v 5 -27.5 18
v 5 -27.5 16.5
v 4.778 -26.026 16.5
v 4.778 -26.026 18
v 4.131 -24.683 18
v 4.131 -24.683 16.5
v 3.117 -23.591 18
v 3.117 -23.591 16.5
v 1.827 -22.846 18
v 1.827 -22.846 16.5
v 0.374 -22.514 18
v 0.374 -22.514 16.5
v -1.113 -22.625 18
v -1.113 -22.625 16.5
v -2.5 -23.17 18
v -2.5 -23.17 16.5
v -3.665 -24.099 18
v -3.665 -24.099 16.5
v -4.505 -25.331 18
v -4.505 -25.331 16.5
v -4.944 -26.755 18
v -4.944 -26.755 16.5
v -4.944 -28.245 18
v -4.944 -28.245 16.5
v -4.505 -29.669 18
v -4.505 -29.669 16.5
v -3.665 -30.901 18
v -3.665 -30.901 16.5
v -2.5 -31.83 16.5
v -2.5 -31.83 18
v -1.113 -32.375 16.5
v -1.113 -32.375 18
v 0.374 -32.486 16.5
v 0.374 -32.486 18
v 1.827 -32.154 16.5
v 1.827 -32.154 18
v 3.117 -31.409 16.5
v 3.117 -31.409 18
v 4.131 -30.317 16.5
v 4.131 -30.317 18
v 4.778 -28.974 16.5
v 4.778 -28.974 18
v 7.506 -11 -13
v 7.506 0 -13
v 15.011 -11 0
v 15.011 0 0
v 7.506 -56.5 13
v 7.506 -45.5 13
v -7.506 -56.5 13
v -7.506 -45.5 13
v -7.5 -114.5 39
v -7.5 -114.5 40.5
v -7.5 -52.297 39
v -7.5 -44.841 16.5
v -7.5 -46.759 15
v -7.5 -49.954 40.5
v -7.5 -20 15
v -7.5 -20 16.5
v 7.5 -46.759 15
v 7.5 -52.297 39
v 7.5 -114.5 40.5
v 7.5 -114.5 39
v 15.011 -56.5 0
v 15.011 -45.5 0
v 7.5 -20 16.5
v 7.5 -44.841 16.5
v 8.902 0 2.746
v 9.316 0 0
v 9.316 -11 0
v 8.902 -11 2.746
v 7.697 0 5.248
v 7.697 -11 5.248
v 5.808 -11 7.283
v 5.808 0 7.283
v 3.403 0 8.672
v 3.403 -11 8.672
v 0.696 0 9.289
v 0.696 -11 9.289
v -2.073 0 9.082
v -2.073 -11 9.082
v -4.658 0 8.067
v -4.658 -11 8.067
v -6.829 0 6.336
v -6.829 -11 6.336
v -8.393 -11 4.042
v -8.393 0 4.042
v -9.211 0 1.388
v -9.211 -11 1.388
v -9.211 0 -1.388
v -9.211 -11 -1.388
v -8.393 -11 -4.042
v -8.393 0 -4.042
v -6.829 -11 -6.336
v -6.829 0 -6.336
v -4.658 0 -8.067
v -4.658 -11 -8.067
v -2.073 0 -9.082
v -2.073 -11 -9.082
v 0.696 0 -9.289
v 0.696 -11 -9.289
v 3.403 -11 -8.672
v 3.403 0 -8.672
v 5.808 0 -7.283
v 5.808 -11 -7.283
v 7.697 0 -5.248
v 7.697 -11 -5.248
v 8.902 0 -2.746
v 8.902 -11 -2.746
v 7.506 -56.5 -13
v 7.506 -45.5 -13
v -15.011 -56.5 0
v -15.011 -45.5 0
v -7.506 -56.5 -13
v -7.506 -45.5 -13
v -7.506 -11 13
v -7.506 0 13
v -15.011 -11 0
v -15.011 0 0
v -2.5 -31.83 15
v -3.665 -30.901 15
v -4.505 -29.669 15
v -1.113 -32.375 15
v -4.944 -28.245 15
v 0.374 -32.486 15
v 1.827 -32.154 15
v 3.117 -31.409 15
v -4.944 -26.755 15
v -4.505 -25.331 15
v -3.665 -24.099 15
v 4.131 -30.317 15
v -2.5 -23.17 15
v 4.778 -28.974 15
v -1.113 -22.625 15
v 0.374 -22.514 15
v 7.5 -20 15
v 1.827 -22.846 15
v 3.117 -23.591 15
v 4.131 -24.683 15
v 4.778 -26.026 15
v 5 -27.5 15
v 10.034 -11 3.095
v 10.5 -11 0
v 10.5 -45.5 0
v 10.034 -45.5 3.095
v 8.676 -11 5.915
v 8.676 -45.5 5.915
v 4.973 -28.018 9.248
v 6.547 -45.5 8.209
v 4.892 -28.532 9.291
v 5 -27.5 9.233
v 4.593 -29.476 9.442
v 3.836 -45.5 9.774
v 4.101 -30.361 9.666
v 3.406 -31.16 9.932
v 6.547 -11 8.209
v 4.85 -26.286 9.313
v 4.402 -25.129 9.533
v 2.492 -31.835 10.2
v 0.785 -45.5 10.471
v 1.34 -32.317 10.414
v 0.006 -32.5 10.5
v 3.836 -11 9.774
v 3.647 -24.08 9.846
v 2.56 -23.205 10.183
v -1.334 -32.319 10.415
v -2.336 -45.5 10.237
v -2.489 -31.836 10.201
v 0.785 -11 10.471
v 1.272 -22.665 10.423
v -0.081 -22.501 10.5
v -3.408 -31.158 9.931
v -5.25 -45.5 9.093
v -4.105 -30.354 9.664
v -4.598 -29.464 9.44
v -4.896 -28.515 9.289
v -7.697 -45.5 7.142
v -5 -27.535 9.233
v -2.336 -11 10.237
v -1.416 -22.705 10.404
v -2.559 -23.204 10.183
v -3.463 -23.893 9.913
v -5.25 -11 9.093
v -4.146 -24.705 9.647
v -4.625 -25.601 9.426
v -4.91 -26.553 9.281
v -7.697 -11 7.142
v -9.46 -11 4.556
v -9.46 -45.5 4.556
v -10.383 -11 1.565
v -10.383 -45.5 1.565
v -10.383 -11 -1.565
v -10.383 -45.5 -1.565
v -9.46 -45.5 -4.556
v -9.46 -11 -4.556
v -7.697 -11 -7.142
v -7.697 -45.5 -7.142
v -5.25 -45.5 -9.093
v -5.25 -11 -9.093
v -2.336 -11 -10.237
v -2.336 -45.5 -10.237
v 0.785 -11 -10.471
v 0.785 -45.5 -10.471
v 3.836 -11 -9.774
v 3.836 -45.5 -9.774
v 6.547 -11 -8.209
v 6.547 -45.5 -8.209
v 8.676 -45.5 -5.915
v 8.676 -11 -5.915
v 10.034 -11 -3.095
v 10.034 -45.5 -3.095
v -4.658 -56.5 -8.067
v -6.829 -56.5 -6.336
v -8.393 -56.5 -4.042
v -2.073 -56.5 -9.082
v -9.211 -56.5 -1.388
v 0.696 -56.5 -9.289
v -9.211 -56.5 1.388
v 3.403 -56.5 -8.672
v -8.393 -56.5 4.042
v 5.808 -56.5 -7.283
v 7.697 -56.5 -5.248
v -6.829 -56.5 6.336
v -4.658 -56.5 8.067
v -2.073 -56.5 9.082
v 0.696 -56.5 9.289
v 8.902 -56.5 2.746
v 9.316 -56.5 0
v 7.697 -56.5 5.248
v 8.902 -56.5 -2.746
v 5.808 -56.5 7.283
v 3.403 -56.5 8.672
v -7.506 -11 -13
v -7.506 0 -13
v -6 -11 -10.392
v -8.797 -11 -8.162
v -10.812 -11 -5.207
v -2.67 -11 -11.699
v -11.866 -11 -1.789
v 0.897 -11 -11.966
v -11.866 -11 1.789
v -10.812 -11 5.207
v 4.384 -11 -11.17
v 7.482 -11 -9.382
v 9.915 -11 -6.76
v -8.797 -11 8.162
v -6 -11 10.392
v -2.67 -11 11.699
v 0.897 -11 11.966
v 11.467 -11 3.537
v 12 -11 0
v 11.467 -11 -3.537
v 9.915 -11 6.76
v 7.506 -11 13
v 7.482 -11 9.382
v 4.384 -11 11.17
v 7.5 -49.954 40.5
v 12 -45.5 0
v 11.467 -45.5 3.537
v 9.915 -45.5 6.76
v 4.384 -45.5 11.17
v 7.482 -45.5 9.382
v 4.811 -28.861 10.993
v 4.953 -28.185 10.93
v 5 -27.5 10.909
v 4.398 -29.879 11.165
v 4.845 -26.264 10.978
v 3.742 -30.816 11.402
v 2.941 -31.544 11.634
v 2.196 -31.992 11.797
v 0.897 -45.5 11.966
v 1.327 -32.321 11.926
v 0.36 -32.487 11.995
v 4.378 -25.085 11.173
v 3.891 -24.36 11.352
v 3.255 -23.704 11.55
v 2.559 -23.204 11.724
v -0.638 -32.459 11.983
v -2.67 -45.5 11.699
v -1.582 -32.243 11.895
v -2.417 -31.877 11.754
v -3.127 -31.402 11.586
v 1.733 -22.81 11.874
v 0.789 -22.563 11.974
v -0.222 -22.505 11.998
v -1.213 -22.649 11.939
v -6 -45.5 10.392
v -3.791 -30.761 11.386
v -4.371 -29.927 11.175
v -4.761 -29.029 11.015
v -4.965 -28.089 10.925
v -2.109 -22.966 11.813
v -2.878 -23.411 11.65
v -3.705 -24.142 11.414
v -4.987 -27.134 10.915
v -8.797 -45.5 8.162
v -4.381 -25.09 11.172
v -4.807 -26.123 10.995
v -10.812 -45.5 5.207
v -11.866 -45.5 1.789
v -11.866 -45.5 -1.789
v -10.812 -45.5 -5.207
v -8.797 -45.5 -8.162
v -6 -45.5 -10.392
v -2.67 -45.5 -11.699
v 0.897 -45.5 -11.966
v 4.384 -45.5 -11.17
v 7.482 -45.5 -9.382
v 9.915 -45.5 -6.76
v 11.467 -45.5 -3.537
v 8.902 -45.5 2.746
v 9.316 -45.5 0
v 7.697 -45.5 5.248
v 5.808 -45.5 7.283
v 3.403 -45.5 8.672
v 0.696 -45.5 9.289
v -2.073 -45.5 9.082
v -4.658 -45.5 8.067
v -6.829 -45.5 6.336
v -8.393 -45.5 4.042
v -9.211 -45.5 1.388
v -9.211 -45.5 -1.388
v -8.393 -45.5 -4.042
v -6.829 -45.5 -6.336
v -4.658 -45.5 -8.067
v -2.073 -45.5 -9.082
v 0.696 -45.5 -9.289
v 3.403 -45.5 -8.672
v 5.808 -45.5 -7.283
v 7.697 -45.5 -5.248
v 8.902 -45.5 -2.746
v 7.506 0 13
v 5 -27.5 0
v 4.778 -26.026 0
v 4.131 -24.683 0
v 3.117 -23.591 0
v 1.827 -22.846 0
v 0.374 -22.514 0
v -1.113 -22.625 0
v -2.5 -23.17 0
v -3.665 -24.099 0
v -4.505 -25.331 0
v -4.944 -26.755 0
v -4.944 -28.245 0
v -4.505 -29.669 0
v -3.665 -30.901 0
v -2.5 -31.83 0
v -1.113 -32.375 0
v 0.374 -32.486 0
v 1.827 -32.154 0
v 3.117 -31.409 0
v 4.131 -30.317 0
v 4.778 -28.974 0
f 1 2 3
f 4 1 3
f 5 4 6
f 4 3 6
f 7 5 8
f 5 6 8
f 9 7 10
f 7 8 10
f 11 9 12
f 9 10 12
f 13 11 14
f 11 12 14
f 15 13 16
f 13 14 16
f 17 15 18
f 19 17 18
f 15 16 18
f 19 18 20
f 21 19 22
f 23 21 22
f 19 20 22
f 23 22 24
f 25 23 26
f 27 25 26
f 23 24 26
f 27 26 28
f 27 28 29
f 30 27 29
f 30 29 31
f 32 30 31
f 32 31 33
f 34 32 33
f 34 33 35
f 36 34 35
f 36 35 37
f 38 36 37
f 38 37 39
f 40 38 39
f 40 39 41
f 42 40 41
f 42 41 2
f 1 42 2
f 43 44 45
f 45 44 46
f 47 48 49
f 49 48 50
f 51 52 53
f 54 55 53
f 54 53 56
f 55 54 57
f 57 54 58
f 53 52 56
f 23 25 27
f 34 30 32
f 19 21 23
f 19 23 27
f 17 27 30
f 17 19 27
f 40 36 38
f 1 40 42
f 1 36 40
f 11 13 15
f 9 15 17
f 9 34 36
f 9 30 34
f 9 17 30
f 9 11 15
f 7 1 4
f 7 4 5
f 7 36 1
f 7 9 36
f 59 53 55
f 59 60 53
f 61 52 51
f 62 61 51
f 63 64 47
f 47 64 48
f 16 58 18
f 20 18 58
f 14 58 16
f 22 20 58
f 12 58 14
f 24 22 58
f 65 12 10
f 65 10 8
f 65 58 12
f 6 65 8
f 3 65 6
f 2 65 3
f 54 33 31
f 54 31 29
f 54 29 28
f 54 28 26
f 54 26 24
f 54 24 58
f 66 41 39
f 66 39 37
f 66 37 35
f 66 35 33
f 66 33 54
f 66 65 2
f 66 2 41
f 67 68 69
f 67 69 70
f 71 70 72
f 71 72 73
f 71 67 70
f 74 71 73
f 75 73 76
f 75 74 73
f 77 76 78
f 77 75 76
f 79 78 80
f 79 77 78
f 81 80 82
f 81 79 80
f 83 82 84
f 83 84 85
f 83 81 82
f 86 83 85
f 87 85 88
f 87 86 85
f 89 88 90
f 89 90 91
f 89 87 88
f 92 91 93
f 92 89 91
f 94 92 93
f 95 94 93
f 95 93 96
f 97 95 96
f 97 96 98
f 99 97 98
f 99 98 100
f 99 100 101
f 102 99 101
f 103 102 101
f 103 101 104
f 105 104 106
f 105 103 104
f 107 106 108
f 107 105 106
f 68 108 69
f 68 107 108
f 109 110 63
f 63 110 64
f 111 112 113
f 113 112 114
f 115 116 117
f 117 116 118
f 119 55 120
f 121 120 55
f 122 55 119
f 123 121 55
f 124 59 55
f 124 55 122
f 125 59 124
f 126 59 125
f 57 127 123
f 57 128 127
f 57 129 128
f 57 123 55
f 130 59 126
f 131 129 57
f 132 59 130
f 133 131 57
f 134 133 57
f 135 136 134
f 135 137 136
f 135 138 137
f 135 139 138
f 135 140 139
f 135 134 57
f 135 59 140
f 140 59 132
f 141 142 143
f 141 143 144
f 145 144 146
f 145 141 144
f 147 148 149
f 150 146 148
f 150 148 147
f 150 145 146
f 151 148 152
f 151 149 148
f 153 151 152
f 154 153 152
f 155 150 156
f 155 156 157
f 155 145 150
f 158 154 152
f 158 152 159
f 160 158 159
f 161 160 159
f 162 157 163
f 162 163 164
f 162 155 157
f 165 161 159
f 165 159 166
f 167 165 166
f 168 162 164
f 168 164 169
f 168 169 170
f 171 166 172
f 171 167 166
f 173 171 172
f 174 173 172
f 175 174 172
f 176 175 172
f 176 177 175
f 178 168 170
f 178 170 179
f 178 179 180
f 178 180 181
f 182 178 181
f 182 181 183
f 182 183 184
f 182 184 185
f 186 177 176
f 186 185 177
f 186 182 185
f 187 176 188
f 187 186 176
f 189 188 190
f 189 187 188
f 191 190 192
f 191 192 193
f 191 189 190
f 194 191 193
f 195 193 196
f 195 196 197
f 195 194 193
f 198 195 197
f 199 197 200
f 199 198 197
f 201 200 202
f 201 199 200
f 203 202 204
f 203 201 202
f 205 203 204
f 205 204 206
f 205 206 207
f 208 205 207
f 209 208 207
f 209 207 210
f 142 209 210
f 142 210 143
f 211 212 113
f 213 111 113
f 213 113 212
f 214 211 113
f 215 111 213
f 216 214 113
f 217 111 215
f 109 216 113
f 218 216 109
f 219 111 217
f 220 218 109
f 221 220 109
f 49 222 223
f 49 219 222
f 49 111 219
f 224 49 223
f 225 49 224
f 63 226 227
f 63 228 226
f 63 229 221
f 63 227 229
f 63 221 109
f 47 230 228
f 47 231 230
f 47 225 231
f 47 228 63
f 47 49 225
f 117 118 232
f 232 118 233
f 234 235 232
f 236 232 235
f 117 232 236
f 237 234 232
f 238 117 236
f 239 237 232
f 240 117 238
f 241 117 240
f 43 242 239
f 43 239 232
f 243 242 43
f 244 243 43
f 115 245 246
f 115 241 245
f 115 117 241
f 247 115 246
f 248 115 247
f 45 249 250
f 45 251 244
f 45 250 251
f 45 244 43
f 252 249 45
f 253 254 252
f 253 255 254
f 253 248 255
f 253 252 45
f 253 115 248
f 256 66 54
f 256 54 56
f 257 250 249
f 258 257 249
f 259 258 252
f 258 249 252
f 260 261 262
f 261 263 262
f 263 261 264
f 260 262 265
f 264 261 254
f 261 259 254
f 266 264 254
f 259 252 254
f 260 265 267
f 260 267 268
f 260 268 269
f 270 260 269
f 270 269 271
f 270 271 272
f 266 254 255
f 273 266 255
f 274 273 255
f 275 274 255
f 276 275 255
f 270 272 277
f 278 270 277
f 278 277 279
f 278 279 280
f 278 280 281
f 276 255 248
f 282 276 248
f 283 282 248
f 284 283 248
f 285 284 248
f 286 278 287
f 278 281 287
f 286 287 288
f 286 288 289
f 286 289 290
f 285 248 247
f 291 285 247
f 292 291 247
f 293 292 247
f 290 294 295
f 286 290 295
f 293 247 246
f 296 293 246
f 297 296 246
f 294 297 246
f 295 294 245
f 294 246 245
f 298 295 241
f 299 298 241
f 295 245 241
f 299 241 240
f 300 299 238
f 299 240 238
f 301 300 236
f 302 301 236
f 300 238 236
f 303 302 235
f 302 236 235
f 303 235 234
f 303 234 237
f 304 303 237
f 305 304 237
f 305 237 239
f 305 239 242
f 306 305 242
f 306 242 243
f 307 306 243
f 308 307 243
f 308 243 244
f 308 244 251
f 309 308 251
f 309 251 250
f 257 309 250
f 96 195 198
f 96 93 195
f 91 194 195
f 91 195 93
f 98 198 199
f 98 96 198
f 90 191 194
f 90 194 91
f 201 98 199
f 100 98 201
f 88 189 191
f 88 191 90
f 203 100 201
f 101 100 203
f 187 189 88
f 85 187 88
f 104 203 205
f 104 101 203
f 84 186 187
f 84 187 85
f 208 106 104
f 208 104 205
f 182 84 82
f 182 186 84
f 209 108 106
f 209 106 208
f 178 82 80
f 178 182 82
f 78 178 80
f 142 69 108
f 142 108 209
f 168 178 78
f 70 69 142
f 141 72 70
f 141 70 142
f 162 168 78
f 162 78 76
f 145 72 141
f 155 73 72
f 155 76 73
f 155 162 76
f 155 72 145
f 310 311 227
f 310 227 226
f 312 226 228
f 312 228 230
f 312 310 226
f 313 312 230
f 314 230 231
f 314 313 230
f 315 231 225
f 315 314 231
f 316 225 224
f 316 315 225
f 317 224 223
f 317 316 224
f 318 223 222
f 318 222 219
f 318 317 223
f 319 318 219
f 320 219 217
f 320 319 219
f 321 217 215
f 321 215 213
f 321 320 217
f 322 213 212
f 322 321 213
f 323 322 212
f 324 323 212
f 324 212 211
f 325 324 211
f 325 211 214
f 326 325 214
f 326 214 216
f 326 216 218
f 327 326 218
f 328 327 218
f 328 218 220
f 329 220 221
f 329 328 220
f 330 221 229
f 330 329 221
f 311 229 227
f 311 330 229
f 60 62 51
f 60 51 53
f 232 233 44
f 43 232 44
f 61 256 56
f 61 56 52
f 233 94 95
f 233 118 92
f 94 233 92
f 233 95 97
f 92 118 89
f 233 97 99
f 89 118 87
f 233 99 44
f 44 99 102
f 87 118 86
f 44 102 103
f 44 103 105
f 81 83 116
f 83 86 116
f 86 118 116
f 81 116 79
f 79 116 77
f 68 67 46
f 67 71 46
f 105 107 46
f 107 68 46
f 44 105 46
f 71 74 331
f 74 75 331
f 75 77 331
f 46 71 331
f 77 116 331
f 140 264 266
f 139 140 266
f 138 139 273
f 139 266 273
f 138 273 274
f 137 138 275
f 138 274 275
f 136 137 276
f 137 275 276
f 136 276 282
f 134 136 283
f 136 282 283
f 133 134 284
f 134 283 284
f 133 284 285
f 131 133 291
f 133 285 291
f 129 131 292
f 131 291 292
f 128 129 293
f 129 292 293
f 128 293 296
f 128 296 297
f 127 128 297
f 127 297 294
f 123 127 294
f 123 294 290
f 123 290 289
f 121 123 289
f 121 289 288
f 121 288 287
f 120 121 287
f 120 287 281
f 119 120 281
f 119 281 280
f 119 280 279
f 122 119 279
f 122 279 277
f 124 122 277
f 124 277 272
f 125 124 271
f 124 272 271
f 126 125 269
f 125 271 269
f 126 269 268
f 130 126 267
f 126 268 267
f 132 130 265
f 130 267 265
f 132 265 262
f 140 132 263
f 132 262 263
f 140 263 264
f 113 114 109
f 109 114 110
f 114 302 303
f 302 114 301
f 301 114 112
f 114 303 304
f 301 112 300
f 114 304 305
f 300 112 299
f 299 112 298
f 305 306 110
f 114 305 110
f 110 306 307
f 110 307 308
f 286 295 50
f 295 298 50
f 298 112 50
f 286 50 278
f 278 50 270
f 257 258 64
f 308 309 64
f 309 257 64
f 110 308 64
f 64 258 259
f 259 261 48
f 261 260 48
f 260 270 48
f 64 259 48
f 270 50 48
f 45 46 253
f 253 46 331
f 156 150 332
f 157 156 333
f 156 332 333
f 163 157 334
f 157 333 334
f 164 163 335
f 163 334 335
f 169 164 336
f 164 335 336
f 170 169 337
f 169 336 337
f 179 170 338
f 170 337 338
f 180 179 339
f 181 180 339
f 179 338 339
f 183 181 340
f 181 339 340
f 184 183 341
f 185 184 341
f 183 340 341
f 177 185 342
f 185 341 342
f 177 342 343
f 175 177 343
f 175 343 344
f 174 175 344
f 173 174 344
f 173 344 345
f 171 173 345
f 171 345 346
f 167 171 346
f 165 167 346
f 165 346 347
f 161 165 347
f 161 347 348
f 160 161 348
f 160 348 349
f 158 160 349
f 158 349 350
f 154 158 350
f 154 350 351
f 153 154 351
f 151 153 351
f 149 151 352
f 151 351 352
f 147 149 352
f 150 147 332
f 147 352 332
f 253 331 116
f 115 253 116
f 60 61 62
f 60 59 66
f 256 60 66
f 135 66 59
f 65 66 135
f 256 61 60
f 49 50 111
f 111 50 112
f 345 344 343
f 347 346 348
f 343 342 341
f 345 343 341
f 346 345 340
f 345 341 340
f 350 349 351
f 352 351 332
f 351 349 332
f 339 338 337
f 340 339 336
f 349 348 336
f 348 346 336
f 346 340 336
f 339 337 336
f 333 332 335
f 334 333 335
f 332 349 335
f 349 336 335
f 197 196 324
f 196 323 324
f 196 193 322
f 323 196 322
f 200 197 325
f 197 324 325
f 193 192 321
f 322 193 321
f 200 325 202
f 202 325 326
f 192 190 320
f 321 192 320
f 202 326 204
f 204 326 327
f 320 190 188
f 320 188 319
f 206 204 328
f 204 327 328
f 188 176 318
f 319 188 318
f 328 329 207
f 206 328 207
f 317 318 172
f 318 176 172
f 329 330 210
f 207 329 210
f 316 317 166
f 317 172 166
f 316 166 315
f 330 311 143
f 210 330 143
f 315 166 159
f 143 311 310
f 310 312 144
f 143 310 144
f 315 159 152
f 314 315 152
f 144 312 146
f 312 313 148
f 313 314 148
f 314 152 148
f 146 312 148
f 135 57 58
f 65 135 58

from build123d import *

# Parameters (mm, degrees)
F0_R     = 9.3155
F1_DEPTH = 11
F2_R     = 12
F2_R_2   = 10.5
F3_DEPTH = 34.5
F4_R     = 9.3155
F5_DEPTH = 11
F6_R     = 5
F7_DEPTH = 18
F9_DEPTH = 7.5


with BuildPart() as f1:
    # F0 (on Front) → F1 (new body)
    with BuildSketch(Plane.XZ):
        Polygon((-7.5055534995, 13), (-15.0111069989, 0), (-7.5055534995, -13), (7.5055534995, -13), (15.0111069989, 0), (7.5055534995, 13), align=None)
        Circle(F0_R, mode=Mode.SUBTRACT)
    extrude(amount=F1_DEPTH)

    # F2 (on face) → F3 (join)
    with BuildSketch(Plane.XZ.offset(11)):
        Circle(F2_R)
        Circle(F2_R_2, mode=Mode.SUBTRACT)
    extrude(amount=F3_DEPTH)

    # F4 (on face) → F5 (join)
    with BuildSketch(Plane.XZ.offset(45.5)):
        Polygon((-7.5055534995, 13), (-15.0111069989, 0), (-7.5055534995, -13), (7.5055534995, -13), (15.0111069989, 0), (7.5055534995, 13), align=None)
        Circle(F4_R, mode=Mode.SUBTRACT)
    extrude(amount=F5_DEPTH)

    # F6 (on Top) → F7 (join)
    with BuildSketch(Plane.XY):
        with Locations((0, -27.5)):
            Circle(F6_R)
    extrude(amount=F7_DEPTH)

    # F8 (on Right) → F9 (join, symmetric)
    with BuildSketch(Plane.YZ):
        Polygon((-20, 15), (-20, 16.5), (-44.8413931031, 16.5), (-49.9539528364, 40.5), (-114.5, 40.5), (-114.5, 39), (-52.2972028911, 39), (-46.7586030031, 15), align=None)
    extrude(amount=F9_DEPTH, both=True)


solid = f1.part
